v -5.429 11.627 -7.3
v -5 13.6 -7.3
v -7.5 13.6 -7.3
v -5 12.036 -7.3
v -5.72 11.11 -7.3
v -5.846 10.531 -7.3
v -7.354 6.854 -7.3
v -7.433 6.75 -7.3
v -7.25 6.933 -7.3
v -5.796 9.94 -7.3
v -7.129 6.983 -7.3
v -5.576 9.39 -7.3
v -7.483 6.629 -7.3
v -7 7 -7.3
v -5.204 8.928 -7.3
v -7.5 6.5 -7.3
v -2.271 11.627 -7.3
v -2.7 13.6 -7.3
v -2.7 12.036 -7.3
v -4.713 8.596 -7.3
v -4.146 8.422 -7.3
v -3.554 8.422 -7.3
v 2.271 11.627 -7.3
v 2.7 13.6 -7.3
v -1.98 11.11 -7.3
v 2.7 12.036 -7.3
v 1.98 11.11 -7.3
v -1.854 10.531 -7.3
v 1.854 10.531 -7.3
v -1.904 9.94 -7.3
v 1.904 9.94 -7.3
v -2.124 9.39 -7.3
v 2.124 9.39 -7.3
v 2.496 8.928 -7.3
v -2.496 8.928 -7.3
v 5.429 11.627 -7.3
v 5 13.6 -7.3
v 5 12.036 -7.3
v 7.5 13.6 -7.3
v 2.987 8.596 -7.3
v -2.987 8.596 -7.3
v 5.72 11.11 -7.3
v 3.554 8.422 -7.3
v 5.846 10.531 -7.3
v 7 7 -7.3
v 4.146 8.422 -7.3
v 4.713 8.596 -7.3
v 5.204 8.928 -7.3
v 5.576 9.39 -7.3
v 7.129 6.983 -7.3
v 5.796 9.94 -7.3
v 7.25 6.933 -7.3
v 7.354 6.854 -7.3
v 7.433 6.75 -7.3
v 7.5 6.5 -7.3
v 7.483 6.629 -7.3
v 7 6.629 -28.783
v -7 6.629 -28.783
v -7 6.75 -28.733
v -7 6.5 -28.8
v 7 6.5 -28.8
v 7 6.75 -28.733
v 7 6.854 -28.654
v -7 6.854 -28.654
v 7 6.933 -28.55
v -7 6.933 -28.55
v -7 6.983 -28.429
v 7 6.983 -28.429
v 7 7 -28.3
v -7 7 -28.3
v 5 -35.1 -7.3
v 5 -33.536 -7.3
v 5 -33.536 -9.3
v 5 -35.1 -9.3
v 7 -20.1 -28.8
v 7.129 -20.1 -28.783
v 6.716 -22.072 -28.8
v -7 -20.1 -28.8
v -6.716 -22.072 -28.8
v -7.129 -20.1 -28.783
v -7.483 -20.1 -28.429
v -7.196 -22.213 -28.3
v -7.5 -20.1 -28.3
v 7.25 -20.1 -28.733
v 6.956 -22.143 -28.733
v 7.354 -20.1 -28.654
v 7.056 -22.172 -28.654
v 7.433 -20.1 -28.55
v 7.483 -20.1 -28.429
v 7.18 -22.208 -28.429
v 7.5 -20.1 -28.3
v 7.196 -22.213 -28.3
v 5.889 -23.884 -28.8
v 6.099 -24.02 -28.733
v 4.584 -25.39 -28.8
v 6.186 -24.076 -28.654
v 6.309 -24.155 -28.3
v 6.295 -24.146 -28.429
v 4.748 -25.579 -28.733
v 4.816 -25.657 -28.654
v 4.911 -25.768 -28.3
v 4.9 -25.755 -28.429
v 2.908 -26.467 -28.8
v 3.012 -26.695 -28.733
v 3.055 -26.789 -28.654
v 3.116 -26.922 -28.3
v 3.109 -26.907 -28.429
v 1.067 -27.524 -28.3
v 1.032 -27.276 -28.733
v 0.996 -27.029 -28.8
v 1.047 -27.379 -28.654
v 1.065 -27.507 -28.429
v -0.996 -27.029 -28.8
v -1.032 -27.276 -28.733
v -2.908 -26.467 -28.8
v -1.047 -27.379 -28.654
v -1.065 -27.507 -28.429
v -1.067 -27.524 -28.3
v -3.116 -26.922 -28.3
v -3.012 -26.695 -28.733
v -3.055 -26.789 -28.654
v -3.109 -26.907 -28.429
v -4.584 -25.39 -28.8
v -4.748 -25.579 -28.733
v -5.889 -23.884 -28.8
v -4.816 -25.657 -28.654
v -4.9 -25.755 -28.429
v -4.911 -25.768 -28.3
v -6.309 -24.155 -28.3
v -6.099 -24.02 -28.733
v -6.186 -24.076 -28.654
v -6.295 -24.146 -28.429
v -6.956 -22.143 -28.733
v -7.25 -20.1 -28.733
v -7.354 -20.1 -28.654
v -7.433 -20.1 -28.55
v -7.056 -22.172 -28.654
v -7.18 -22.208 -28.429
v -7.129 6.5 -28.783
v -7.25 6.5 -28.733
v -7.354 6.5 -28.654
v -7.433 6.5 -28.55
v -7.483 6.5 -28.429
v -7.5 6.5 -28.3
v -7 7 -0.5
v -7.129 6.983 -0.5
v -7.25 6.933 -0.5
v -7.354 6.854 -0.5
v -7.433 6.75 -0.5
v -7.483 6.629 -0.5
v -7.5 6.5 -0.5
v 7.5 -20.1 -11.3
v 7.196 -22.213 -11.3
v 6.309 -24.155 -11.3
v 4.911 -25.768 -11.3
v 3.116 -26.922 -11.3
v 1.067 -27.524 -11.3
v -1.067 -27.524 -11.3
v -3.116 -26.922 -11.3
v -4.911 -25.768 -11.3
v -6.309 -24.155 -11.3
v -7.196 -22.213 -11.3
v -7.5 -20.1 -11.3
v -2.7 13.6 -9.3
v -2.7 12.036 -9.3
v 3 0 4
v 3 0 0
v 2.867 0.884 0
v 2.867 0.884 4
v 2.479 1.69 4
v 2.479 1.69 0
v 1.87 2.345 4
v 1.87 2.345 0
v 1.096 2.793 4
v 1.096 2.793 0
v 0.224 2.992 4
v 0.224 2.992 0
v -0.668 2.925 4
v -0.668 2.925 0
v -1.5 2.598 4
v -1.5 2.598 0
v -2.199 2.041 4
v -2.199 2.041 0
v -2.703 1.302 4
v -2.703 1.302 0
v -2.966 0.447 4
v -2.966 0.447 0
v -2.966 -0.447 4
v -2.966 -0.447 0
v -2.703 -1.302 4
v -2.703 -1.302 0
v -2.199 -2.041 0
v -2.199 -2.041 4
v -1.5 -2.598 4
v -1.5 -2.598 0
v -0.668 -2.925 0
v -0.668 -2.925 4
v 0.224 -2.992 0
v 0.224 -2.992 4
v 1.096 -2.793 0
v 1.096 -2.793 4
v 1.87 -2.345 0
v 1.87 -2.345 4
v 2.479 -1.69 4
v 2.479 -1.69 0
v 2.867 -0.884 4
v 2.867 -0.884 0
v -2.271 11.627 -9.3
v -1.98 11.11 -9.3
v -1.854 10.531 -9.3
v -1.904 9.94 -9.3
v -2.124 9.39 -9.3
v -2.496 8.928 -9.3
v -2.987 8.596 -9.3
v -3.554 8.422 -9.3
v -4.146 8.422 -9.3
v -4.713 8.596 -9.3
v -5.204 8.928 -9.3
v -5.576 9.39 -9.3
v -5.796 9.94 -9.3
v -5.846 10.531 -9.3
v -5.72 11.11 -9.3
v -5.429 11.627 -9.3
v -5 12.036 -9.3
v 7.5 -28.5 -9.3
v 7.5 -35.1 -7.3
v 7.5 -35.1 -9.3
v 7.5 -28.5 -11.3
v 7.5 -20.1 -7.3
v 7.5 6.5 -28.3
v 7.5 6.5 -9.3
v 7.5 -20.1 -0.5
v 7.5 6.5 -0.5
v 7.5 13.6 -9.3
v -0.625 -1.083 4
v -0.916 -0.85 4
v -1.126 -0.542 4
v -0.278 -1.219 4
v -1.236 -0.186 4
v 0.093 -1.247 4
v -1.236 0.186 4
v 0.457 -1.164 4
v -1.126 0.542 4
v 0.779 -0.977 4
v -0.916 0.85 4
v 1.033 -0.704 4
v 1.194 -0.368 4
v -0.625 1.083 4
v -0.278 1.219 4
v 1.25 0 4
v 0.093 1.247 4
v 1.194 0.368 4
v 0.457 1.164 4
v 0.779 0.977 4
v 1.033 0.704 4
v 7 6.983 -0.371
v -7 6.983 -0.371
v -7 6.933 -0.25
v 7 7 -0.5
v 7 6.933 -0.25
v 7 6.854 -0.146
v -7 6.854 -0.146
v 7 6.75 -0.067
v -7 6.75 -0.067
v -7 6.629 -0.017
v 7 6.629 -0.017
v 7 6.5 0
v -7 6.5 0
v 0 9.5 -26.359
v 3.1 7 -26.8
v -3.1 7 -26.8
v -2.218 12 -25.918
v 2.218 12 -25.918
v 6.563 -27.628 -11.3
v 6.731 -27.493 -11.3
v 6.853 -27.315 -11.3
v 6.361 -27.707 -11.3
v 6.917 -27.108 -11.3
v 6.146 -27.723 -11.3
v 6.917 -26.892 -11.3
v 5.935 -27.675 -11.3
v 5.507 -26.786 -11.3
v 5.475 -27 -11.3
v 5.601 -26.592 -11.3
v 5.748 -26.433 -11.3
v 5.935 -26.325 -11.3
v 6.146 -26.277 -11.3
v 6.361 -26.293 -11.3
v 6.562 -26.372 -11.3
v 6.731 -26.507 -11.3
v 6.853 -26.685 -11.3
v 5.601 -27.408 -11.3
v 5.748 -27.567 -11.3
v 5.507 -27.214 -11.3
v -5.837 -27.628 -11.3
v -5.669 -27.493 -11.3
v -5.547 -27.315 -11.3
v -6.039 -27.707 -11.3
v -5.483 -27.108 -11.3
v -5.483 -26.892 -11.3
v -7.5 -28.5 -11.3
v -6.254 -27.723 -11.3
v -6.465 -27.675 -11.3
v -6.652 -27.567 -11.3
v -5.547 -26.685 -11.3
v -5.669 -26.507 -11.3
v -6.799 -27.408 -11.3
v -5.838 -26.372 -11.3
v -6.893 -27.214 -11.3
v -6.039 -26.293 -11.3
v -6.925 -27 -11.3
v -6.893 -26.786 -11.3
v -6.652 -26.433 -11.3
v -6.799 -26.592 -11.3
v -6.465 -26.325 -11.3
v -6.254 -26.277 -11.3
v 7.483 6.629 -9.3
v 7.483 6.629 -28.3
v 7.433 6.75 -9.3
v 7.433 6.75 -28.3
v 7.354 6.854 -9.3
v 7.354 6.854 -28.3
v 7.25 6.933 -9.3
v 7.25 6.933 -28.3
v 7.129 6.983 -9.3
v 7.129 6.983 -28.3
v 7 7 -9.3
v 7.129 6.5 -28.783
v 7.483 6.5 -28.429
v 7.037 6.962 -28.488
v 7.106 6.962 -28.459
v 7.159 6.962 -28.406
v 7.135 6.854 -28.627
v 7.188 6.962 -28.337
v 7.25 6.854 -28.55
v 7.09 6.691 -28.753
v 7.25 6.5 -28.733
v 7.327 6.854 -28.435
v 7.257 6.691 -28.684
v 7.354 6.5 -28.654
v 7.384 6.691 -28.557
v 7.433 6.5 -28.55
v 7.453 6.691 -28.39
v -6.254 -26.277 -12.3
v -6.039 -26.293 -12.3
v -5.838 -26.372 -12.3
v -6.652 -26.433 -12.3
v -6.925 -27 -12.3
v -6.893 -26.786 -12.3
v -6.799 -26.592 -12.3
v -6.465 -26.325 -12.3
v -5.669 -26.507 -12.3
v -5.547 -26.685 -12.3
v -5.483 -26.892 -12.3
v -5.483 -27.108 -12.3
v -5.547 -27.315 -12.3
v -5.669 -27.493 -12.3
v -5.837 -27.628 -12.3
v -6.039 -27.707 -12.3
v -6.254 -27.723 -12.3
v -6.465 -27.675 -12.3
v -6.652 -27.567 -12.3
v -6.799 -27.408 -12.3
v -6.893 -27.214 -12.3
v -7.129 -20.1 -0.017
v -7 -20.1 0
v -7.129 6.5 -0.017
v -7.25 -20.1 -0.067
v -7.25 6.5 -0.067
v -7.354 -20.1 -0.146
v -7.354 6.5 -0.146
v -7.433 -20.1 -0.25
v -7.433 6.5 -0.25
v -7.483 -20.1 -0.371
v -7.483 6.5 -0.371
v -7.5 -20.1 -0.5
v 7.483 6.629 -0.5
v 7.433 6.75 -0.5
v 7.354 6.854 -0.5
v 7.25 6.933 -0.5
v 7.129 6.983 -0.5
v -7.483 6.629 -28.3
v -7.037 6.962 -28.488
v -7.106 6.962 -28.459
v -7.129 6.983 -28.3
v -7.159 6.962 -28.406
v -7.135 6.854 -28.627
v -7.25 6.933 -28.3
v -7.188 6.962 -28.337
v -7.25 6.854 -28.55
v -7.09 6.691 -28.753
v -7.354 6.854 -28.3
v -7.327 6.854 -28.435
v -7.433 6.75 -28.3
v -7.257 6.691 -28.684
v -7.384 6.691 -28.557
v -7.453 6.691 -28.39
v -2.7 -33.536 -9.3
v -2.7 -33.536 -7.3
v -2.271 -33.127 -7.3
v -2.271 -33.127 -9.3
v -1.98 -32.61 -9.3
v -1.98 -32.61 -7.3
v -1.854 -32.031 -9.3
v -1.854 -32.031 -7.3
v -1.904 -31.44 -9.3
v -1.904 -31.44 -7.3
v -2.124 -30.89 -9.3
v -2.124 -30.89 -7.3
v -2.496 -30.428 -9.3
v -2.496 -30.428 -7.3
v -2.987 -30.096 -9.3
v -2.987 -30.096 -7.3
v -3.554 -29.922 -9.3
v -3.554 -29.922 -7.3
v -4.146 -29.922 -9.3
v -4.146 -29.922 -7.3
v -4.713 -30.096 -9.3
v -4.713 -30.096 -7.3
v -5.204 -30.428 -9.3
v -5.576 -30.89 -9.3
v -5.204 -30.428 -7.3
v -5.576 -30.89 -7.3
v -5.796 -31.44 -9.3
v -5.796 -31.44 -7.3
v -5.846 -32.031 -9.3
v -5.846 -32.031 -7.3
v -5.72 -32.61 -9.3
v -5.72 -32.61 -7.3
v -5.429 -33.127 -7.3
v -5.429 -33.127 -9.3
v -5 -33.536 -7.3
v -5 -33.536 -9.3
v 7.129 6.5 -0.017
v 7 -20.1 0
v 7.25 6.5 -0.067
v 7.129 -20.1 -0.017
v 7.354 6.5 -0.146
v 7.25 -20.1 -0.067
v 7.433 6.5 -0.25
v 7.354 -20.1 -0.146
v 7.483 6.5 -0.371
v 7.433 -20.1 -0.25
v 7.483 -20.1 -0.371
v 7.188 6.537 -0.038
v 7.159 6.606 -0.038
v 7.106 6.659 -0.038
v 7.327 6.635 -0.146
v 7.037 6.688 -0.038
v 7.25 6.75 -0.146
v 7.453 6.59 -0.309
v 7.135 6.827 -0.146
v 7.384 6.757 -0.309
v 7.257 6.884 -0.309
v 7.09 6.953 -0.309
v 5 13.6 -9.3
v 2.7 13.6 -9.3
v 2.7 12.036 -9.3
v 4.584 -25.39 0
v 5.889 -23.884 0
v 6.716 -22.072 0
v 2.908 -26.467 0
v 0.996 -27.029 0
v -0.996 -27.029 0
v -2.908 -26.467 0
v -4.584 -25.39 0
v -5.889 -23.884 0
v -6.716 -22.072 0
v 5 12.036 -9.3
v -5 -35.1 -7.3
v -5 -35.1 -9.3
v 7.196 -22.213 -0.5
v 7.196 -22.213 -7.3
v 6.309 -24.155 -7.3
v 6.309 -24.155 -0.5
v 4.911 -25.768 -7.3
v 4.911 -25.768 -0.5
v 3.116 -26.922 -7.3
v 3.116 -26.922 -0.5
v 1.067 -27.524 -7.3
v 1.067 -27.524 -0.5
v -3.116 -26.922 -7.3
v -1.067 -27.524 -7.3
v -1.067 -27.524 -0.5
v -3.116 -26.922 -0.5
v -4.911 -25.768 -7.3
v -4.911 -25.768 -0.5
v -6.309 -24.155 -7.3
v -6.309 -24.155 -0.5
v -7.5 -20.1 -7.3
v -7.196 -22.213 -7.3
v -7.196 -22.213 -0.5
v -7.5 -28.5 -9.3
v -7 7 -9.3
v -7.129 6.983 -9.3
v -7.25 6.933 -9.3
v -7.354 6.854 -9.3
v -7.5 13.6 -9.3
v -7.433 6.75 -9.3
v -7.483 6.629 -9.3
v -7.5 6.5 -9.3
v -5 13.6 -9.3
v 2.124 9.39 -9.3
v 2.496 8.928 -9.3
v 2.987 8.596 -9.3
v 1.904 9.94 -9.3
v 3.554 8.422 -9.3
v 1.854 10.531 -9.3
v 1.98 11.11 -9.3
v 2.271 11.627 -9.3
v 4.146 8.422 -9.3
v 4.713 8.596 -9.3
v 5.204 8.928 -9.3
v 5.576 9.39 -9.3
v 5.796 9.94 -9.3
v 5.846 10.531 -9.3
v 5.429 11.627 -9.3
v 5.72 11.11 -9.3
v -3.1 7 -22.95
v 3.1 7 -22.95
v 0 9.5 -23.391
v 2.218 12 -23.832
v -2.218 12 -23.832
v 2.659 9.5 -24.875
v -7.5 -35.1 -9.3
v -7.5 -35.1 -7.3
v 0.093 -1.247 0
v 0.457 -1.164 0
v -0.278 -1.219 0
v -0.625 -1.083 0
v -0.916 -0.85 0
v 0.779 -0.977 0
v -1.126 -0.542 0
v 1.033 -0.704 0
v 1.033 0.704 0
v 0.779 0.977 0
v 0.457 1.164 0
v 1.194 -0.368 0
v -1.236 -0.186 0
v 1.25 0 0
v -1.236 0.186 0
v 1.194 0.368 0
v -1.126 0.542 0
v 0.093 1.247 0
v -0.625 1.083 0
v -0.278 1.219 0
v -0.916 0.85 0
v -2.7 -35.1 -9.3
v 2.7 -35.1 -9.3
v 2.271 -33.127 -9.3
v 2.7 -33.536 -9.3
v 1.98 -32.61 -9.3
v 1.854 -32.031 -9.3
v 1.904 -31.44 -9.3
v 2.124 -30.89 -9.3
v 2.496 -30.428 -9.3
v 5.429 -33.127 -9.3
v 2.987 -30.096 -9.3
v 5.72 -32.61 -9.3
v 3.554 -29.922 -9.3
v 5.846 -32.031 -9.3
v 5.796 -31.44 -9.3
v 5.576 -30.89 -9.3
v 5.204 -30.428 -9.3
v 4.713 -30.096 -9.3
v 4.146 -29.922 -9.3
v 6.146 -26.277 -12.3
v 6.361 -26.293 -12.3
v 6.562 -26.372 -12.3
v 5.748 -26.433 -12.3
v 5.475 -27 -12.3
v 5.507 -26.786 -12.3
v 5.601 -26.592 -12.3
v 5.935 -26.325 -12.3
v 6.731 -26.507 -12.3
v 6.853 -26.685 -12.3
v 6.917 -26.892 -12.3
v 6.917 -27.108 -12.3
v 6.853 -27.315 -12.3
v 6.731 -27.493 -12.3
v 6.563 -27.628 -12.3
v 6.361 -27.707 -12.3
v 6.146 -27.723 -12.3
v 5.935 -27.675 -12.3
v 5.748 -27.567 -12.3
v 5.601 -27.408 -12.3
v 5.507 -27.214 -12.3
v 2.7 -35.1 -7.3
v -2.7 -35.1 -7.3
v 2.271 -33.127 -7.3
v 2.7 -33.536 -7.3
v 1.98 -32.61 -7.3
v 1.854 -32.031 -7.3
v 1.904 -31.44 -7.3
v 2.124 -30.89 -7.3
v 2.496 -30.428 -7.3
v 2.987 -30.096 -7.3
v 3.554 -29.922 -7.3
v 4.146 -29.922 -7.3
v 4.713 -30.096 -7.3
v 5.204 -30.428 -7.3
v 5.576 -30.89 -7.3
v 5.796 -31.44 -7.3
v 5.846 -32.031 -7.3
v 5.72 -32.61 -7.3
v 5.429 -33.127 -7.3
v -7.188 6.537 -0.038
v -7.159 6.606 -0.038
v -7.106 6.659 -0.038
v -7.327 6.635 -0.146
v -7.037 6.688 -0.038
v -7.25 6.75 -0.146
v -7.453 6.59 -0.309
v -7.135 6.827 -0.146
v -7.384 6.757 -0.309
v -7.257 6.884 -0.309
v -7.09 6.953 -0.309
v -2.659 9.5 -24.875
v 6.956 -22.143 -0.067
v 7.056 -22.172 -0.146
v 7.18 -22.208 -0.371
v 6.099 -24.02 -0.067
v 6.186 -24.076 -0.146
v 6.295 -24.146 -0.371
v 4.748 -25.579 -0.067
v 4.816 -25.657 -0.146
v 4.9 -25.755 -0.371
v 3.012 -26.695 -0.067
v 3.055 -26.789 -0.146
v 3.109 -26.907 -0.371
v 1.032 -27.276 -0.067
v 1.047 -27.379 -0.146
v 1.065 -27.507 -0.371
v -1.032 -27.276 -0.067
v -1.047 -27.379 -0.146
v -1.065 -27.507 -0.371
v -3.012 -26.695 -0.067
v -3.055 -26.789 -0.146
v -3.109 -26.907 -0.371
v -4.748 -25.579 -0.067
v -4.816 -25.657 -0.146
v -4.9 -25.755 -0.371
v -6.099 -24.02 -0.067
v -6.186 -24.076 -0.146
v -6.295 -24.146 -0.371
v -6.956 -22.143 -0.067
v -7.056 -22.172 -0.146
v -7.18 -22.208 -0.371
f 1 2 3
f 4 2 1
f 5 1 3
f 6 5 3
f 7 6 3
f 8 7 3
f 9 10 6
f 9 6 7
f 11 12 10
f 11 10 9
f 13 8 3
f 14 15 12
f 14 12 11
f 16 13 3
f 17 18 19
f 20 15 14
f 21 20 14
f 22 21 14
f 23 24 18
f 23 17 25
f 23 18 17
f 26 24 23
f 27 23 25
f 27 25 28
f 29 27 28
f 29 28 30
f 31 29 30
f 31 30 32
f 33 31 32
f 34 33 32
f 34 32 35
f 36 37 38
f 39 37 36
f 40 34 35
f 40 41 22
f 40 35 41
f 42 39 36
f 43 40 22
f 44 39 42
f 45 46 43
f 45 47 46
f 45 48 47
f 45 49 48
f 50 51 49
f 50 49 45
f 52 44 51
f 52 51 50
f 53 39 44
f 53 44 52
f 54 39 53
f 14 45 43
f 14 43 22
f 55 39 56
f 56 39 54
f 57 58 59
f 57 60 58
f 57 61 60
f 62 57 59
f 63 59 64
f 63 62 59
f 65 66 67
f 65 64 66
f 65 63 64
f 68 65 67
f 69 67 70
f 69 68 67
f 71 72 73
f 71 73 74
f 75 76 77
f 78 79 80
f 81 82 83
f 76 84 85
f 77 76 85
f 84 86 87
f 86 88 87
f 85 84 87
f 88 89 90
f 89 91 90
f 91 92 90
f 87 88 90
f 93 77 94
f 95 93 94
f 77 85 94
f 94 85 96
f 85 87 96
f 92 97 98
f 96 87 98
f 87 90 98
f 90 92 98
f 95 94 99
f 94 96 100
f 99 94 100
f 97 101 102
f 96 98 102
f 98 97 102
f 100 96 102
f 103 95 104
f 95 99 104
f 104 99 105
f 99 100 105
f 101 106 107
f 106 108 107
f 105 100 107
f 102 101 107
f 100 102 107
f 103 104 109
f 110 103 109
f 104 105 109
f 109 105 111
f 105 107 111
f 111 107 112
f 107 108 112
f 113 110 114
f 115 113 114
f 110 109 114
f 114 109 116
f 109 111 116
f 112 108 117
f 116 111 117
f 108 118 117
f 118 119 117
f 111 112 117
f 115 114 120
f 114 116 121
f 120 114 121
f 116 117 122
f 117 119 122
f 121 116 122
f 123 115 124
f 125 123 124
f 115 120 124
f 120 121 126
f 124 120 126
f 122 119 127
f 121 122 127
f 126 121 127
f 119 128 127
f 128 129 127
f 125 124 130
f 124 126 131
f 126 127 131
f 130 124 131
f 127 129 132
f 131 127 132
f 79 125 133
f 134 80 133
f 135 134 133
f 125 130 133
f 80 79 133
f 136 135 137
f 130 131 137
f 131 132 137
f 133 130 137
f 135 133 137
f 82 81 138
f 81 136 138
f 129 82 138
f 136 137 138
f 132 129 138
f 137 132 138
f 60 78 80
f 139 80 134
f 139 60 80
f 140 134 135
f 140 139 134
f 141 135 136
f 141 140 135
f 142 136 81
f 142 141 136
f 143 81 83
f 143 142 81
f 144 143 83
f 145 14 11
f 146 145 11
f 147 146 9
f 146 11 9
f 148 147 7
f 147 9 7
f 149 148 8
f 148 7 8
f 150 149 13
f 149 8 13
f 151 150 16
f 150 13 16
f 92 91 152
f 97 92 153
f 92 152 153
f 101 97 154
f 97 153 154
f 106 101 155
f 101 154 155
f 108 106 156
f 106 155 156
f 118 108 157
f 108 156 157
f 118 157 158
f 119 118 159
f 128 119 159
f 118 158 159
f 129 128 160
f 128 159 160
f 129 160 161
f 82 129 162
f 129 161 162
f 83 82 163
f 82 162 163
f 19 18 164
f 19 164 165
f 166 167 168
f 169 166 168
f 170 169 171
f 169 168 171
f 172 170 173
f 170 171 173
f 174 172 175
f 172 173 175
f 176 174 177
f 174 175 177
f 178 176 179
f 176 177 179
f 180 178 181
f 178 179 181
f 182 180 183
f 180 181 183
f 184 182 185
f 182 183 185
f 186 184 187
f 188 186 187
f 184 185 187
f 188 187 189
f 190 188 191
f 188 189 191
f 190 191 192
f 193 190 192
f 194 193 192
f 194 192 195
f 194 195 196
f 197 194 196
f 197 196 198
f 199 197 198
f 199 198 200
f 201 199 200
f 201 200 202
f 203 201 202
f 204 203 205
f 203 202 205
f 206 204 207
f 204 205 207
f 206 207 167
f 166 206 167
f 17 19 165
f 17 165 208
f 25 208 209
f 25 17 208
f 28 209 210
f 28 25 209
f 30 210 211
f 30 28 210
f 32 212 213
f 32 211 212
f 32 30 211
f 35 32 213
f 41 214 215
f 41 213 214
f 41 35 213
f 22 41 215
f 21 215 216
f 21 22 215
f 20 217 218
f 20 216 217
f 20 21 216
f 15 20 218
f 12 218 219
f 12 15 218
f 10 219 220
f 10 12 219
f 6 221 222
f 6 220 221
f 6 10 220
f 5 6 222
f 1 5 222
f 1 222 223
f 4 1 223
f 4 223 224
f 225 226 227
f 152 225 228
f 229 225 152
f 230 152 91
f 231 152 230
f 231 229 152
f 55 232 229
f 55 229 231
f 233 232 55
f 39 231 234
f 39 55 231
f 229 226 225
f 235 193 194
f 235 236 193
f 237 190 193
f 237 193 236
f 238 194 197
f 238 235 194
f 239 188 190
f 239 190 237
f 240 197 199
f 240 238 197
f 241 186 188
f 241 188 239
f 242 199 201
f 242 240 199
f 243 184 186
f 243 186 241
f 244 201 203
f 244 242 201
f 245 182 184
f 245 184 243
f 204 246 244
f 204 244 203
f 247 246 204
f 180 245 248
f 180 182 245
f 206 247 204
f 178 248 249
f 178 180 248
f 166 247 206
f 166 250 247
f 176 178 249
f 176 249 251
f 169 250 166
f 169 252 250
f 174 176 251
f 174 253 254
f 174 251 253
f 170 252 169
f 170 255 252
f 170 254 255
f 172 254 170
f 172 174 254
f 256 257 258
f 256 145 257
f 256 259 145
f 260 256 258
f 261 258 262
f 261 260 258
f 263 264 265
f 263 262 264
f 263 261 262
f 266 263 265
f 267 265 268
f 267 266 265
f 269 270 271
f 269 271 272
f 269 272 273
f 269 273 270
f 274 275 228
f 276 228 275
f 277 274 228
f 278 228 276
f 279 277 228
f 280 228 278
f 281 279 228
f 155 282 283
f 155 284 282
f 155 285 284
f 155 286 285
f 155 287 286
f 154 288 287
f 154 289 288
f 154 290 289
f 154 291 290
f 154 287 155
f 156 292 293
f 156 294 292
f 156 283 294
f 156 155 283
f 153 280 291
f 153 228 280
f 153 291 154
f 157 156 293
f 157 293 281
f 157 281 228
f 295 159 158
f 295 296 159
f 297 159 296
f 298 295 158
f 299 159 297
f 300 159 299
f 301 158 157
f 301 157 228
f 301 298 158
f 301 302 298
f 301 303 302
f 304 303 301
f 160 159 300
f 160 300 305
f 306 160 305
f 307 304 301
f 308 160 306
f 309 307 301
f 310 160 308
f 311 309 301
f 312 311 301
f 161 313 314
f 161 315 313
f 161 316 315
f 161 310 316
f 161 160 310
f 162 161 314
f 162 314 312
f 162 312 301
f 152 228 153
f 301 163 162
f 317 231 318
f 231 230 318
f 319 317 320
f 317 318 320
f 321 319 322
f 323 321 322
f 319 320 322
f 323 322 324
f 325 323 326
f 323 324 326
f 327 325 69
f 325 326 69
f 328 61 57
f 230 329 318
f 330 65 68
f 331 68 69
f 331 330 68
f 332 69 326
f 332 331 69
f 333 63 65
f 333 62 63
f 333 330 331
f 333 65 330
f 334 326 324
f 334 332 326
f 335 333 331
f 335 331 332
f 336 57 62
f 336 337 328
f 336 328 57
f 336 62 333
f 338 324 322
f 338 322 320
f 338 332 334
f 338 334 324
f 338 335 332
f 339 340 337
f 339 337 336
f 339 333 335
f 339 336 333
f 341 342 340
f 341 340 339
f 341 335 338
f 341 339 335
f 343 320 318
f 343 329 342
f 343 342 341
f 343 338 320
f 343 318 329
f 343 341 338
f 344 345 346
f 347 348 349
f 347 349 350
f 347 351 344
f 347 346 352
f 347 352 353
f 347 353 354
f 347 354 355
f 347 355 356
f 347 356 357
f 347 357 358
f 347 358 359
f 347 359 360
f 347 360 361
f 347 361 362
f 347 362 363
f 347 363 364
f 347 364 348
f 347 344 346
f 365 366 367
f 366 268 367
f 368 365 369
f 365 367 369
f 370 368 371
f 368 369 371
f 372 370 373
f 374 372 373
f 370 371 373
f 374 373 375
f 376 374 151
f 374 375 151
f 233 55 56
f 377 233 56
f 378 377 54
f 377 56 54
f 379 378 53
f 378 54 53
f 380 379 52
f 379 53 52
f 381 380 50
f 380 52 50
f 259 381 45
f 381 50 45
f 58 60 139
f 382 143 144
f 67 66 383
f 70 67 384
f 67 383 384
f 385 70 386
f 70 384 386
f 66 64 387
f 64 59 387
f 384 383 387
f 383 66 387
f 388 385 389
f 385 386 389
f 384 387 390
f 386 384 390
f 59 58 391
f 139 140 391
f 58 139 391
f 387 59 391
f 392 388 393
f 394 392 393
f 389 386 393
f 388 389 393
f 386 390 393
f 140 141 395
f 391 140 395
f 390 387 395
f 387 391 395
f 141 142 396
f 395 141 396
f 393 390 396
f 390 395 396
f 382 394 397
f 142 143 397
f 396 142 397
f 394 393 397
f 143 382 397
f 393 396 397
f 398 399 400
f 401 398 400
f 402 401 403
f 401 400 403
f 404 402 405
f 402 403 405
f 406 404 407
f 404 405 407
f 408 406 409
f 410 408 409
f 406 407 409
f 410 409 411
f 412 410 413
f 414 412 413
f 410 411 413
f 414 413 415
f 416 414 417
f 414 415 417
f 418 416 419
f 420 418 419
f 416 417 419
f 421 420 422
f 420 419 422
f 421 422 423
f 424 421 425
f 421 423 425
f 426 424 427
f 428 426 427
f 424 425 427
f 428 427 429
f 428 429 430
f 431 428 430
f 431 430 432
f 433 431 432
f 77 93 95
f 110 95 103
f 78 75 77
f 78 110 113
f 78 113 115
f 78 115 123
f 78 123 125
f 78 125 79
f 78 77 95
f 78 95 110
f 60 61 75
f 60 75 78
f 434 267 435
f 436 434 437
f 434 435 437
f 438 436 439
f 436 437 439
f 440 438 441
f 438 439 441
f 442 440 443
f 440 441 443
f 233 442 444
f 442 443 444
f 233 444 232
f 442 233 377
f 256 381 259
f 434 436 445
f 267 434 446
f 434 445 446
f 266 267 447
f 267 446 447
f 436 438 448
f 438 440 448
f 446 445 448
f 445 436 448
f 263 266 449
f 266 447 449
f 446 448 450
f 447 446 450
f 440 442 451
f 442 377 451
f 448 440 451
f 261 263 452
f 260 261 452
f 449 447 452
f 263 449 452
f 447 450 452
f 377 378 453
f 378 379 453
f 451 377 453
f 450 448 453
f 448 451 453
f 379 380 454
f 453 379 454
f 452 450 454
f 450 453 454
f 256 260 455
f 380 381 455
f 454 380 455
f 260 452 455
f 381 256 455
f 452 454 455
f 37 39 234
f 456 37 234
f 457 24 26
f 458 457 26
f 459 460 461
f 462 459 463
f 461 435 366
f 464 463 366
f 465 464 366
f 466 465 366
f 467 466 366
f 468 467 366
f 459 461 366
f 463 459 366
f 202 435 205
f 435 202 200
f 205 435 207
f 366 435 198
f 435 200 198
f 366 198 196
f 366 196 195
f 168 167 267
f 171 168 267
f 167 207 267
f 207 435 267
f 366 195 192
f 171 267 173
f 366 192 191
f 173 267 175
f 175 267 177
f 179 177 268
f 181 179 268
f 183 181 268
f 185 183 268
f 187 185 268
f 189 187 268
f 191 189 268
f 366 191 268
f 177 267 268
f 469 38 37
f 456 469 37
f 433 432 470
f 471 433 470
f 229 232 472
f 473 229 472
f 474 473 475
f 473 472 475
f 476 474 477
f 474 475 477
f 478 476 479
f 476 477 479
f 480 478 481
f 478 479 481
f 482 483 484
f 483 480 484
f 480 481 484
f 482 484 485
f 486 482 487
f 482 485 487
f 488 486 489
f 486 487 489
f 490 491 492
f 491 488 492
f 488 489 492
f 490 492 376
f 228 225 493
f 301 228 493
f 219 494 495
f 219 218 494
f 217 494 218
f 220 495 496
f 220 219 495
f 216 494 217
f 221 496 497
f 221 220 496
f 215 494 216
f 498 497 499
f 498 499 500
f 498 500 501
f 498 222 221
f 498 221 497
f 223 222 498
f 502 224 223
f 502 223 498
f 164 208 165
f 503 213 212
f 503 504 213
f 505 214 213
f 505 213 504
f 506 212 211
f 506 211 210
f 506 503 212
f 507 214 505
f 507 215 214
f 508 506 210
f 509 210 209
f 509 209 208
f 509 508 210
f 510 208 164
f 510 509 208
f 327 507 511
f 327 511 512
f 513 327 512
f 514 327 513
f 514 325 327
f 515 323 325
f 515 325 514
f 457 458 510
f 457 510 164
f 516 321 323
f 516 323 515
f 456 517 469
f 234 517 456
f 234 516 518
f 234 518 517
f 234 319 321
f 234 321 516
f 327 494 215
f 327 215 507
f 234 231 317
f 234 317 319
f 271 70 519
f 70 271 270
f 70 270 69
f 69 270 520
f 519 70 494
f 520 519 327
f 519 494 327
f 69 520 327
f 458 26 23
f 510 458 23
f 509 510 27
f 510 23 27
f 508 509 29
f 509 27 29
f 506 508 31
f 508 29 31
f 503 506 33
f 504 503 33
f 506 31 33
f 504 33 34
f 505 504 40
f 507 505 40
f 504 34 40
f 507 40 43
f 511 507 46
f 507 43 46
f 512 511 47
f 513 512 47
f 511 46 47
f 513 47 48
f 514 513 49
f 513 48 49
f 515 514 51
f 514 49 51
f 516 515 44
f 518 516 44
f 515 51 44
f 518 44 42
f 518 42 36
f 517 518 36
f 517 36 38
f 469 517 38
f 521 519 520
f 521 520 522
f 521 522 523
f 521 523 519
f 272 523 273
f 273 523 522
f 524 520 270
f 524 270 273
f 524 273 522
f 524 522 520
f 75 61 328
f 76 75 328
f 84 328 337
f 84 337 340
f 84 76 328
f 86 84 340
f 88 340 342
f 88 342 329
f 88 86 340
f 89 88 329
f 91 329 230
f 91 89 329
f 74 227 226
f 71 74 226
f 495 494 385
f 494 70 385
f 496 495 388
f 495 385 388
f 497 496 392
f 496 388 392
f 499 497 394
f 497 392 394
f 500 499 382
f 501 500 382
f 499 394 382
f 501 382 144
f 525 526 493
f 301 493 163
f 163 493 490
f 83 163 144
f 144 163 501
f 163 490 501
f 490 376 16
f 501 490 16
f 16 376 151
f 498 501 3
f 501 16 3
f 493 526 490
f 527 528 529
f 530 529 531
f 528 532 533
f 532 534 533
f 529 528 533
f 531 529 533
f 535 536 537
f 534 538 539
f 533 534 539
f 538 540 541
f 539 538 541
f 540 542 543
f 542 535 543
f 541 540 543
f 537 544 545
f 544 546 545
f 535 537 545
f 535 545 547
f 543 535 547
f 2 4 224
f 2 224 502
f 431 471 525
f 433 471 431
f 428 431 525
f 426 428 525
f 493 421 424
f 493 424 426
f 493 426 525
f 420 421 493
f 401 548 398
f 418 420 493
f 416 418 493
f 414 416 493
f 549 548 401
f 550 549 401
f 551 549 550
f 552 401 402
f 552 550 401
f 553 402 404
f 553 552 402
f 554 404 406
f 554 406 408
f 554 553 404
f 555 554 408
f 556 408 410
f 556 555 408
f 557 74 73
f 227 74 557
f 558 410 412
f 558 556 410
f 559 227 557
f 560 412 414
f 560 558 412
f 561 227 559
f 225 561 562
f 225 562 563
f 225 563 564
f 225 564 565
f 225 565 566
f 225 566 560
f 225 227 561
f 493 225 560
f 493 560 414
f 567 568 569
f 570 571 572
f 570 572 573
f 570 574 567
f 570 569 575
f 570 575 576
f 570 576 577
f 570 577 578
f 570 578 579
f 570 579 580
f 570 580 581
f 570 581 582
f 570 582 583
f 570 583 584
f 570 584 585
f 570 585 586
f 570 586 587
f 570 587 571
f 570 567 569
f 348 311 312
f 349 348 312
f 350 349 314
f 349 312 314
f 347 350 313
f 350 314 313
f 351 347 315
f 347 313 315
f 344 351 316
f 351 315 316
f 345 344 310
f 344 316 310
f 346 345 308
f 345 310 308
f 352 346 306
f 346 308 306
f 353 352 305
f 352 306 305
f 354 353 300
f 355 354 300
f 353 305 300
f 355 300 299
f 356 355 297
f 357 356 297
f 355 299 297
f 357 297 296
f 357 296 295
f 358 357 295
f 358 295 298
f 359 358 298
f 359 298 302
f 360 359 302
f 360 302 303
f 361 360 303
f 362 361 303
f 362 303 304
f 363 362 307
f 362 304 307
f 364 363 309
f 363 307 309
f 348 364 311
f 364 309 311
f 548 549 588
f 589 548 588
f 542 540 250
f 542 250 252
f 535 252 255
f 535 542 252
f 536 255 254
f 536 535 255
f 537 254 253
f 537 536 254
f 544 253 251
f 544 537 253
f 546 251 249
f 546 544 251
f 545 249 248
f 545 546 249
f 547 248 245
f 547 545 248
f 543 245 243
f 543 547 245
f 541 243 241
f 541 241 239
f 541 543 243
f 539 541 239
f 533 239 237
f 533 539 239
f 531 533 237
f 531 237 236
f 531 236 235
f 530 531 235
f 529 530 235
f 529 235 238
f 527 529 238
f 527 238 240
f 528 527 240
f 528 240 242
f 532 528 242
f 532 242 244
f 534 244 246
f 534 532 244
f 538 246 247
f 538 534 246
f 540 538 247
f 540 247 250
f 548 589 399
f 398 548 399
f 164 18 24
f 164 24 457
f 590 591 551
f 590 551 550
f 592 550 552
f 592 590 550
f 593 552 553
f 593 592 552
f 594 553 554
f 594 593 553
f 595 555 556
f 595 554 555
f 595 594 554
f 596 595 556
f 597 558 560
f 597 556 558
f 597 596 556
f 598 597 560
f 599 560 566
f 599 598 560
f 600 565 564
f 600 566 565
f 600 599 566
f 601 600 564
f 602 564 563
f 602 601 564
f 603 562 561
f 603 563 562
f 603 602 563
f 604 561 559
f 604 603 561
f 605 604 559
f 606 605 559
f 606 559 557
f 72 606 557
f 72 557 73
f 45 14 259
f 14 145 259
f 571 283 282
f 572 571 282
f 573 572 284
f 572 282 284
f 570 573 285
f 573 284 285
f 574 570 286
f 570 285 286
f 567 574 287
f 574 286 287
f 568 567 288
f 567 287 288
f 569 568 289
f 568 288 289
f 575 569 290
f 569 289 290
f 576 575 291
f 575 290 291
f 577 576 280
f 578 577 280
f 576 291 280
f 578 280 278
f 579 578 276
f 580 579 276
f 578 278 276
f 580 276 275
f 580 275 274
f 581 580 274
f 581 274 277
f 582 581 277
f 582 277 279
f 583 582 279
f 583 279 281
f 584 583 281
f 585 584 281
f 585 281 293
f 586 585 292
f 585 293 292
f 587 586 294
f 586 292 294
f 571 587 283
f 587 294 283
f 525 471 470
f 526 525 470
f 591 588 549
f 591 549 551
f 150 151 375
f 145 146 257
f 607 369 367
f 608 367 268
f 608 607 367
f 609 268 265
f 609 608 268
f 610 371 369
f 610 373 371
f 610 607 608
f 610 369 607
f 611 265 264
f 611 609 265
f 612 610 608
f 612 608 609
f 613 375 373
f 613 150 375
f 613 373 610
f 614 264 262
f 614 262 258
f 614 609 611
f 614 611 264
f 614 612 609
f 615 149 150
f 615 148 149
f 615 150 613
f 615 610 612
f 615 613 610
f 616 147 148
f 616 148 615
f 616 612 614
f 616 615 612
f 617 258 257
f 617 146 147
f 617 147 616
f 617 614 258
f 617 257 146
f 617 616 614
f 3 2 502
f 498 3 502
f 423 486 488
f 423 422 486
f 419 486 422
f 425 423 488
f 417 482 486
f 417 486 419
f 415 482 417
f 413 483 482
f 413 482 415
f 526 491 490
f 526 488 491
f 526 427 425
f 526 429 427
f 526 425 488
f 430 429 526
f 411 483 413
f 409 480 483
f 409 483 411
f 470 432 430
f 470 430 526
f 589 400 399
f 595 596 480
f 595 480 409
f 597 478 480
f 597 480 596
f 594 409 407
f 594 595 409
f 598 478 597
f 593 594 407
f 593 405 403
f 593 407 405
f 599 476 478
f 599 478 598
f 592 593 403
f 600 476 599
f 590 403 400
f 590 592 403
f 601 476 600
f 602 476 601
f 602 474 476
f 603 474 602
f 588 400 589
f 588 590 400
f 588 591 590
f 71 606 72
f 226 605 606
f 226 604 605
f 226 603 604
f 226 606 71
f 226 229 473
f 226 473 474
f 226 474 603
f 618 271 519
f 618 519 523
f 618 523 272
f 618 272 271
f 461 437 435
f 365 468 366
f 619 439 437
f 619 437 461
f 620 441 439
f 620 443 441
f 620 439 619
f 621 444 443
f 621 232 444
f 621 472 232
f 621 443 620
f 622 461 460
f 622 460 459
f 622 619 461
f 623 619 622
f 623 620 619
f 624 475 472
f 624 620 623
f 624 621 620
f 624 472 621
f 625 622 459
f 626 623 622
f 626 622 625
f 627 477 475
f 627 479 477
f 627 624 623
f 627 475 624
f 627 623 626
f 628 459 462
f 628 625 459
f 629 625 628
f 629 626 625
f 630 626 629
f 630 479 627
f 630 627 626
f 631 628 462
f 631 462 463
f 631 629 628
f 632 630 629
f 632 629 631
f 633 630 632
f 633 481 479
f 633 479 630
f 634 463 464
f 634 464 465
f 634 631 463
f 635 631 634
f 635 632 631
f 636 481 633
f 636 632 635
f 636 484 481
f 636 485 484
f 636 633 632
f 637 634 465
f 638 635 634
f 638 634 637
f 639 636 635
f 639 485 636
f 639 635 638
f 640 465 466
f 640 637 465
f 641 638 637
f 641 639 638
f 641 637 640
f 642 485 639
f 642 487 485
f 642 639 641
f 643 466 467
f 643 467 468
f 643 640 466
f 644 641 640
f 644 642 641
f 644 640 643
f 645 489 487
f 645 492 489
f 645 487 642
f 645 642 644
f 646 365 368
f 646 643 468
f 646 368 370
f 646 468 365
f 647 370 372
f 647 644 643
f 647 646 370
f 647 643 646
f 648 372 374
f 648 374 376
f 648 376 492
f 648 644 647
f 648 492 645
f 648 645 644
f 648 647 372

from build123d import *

# Parameters (mm, degrees)
BOSS_EXTRUDE1_DEPTH     = 28.8
SKETCH3_R               = 3
SKETCH3_R_2             = 1.25
BOSS_EXTRUDE2_DEPTH     = 4
BOSS_EXTRUDE3_DEPTH     = 7.5
SKETCH5_W               = 15
SKETCH5_H               = 13.170644239
BOSS_EXTRUDE4_DEPTH     = 2
SKETCH6_R               = 0.725
BOSS_EXTRUDE5_DEPTH     = 1
CUT_EXTRUDE1_DEPTH      = 5
CUT_EXTRUDE1_DEPTH_BACK = 29.8
SKETCH8_W               = 6.2
SKETCH8_H               = 3.85
BOSS_EXTRUDE6_DEPTH     = 5
BOSS_EXTRUDE6_TAPER     = 10
FILLET1_R               = 0.5


with BuildPart() as part:
    # Sketch2 → Boss-Extrude1 (new body)
    with BuildSketch(Plane.XY):
        with BuildLine():
            Line((-7.5, 7), (7.5, 7))
            Line((7.5, 7), (7.5, -20.1))
            ThreePointArc((7.5, -20.1), (0, -27.6), (-7.5, -20.1))
            Line((-7.5, -20.1), (-7.5, 7))
        make_face()
    extrude(amount=-BOSS_EXTRUDE1_DEPTH)

    # Sketch3 → Boss-Extrude2 (add)
    with BuildSketch(Plane.XY):
        Circle(SKETCH3_R)
        Circle(SKETCH3_R_2, mode=Mode.SUBTRACT)
    extrude(amount=BOSS_EXTRUDE2_DEPTH)

    # Sketch4 → Boss-Extrude3 (add, symmetric)
    with BuildSketch(Plane(origin=(0, 0, 0), x_dir=(0, 0, -1), z_dir=(1, 0, 0))):
        Polygon((7.3, 7), (7.3, 13.6), (9.3, 13.6), (9.3, 7), (9.3, -35.1), (7.3, -35.1), align=None)
    extrude(amount=BOSS_EXTRUDE3_DEPTH, both=True)

    # Sketch5 → Boss-Extrude4 (add)
    with BuildSketch(Plane(origin=(0, 0, -9.3), x_dir=(-1, 0, 0), z_dir=(0, 0, -1))):
        with Locations((0, -21.914677881)):
            Rectangle(SKETCH5_W, SKETCH5_H)
    extrude(amount=BOSS_EXTRUDE4_DEPTH)

    # Sketch6 → Boss-Extrude5 (add)
    with BuildSketch(Plane(origin=(0, 0, -11.3), x_dir=(-1, 0, 0), z_dir=(0, 0, -1))):
        with Locations((-6.2, -27)):
            Circle(SKETCH6_R)
        with Locations((6.2, -27)):
            Circle(SKETCH6_R)
    extrude(amount=BOSS_EXTRUDE5_DEPTH)

    # Sketch7 → Cut-Extrude1 (cut, two sides)
    with BuildSketch(Plane.XY) as cut_extrude1_sk:
        with BuildLine():
            Line((-5, 12.036306817), (-5, 13.6))
            Line((-5, 13.6), (-2.7, 13.6))
            Line((-2.7, 13.6), (-2.7, 12.036306817))
            ThreePointArc((-2.7, 12.036306817), (-3.85, 8.4), (-5, 12.036306817))
        make_face()
        with BuildLine():
            Line((2.7, 13.6), (2.7, 12.036306817))
            ThreePointArc((2.7, 12.036306817), (3.85, 8.4), (5, 12.036306817))
            Line((5, 12.036306817), (5, 13.6))
            Line((5, 13.6), (2.7, 13.6))
        make_face()
        with BuildLine():
            Line((5, -33.536306817), (5, -35.1))
            Line((5, -35.1), (2.7, -35.1))
            Line((2.7, -35.1), (2.7, -33.536306817))
            ThreePointArc((2.7, -33.536306817), (3.85, -29.9), (5, -33.536306817))
        make_face()
        with BuildLine():
            Line((-2.7, -35.1), (-2.7, -33.536306817))
            ThreePointArc((-2.7, -33.536306817), (-3.85, -29.9), (-5, -33.536306817))
            Line((-5, -33.536306817), (-5, -35.1))
            Line((-5, -35.1), (-2.7, -35.1))
        make_face()
    extrude(amount=CUT_EXTRUDE1_DEPTH, mode=Mode.SUBTRACT)
    extrude(cut_extrude1_sk.sketch, amount=-CUT_EXTRUDE1_DEPTH_BACK, mode=Mode.SUBTRACT)

    # Sketch8 → Boss-Extrude6 (add)
    with BuildSketch(Plane(origin=(0, 7, 0), x_dir=(1, 0, 0), z_dir=(0, 1, 0))):
        with Locations((0, 24.875)):
            Rectangle(SKETCH8_W, SKETCH8_H)
    extrude(amount=BOSS_EXTRUDE6_DEPTH, taper=BOSS_EXTRUDE6_TAPER)

    # Fillet1
    fillet1_edges = [part.edges().sort_by_distance(p)[0] for p in [
        (-7.5, -6.55, -28.8),
        (0, -27.6, -28.8),
        (7.5, 7, -3.65),
        (-7.5, 7, -3.65),
        (7.5, -6.55, -28.8),
        (0, -27.6, 0),
        (-7.5, -6.55, 0),
        (0, 7, 0),
        (7.5, -6.55, 0),
        (0, 7, -28.8),
        (-7.5, 7, -19.05),
        (7.5, 7, -19.05),
    ]]
    fillet(fillet1_edges, radius=FILLET1_R)


solid = part.part
